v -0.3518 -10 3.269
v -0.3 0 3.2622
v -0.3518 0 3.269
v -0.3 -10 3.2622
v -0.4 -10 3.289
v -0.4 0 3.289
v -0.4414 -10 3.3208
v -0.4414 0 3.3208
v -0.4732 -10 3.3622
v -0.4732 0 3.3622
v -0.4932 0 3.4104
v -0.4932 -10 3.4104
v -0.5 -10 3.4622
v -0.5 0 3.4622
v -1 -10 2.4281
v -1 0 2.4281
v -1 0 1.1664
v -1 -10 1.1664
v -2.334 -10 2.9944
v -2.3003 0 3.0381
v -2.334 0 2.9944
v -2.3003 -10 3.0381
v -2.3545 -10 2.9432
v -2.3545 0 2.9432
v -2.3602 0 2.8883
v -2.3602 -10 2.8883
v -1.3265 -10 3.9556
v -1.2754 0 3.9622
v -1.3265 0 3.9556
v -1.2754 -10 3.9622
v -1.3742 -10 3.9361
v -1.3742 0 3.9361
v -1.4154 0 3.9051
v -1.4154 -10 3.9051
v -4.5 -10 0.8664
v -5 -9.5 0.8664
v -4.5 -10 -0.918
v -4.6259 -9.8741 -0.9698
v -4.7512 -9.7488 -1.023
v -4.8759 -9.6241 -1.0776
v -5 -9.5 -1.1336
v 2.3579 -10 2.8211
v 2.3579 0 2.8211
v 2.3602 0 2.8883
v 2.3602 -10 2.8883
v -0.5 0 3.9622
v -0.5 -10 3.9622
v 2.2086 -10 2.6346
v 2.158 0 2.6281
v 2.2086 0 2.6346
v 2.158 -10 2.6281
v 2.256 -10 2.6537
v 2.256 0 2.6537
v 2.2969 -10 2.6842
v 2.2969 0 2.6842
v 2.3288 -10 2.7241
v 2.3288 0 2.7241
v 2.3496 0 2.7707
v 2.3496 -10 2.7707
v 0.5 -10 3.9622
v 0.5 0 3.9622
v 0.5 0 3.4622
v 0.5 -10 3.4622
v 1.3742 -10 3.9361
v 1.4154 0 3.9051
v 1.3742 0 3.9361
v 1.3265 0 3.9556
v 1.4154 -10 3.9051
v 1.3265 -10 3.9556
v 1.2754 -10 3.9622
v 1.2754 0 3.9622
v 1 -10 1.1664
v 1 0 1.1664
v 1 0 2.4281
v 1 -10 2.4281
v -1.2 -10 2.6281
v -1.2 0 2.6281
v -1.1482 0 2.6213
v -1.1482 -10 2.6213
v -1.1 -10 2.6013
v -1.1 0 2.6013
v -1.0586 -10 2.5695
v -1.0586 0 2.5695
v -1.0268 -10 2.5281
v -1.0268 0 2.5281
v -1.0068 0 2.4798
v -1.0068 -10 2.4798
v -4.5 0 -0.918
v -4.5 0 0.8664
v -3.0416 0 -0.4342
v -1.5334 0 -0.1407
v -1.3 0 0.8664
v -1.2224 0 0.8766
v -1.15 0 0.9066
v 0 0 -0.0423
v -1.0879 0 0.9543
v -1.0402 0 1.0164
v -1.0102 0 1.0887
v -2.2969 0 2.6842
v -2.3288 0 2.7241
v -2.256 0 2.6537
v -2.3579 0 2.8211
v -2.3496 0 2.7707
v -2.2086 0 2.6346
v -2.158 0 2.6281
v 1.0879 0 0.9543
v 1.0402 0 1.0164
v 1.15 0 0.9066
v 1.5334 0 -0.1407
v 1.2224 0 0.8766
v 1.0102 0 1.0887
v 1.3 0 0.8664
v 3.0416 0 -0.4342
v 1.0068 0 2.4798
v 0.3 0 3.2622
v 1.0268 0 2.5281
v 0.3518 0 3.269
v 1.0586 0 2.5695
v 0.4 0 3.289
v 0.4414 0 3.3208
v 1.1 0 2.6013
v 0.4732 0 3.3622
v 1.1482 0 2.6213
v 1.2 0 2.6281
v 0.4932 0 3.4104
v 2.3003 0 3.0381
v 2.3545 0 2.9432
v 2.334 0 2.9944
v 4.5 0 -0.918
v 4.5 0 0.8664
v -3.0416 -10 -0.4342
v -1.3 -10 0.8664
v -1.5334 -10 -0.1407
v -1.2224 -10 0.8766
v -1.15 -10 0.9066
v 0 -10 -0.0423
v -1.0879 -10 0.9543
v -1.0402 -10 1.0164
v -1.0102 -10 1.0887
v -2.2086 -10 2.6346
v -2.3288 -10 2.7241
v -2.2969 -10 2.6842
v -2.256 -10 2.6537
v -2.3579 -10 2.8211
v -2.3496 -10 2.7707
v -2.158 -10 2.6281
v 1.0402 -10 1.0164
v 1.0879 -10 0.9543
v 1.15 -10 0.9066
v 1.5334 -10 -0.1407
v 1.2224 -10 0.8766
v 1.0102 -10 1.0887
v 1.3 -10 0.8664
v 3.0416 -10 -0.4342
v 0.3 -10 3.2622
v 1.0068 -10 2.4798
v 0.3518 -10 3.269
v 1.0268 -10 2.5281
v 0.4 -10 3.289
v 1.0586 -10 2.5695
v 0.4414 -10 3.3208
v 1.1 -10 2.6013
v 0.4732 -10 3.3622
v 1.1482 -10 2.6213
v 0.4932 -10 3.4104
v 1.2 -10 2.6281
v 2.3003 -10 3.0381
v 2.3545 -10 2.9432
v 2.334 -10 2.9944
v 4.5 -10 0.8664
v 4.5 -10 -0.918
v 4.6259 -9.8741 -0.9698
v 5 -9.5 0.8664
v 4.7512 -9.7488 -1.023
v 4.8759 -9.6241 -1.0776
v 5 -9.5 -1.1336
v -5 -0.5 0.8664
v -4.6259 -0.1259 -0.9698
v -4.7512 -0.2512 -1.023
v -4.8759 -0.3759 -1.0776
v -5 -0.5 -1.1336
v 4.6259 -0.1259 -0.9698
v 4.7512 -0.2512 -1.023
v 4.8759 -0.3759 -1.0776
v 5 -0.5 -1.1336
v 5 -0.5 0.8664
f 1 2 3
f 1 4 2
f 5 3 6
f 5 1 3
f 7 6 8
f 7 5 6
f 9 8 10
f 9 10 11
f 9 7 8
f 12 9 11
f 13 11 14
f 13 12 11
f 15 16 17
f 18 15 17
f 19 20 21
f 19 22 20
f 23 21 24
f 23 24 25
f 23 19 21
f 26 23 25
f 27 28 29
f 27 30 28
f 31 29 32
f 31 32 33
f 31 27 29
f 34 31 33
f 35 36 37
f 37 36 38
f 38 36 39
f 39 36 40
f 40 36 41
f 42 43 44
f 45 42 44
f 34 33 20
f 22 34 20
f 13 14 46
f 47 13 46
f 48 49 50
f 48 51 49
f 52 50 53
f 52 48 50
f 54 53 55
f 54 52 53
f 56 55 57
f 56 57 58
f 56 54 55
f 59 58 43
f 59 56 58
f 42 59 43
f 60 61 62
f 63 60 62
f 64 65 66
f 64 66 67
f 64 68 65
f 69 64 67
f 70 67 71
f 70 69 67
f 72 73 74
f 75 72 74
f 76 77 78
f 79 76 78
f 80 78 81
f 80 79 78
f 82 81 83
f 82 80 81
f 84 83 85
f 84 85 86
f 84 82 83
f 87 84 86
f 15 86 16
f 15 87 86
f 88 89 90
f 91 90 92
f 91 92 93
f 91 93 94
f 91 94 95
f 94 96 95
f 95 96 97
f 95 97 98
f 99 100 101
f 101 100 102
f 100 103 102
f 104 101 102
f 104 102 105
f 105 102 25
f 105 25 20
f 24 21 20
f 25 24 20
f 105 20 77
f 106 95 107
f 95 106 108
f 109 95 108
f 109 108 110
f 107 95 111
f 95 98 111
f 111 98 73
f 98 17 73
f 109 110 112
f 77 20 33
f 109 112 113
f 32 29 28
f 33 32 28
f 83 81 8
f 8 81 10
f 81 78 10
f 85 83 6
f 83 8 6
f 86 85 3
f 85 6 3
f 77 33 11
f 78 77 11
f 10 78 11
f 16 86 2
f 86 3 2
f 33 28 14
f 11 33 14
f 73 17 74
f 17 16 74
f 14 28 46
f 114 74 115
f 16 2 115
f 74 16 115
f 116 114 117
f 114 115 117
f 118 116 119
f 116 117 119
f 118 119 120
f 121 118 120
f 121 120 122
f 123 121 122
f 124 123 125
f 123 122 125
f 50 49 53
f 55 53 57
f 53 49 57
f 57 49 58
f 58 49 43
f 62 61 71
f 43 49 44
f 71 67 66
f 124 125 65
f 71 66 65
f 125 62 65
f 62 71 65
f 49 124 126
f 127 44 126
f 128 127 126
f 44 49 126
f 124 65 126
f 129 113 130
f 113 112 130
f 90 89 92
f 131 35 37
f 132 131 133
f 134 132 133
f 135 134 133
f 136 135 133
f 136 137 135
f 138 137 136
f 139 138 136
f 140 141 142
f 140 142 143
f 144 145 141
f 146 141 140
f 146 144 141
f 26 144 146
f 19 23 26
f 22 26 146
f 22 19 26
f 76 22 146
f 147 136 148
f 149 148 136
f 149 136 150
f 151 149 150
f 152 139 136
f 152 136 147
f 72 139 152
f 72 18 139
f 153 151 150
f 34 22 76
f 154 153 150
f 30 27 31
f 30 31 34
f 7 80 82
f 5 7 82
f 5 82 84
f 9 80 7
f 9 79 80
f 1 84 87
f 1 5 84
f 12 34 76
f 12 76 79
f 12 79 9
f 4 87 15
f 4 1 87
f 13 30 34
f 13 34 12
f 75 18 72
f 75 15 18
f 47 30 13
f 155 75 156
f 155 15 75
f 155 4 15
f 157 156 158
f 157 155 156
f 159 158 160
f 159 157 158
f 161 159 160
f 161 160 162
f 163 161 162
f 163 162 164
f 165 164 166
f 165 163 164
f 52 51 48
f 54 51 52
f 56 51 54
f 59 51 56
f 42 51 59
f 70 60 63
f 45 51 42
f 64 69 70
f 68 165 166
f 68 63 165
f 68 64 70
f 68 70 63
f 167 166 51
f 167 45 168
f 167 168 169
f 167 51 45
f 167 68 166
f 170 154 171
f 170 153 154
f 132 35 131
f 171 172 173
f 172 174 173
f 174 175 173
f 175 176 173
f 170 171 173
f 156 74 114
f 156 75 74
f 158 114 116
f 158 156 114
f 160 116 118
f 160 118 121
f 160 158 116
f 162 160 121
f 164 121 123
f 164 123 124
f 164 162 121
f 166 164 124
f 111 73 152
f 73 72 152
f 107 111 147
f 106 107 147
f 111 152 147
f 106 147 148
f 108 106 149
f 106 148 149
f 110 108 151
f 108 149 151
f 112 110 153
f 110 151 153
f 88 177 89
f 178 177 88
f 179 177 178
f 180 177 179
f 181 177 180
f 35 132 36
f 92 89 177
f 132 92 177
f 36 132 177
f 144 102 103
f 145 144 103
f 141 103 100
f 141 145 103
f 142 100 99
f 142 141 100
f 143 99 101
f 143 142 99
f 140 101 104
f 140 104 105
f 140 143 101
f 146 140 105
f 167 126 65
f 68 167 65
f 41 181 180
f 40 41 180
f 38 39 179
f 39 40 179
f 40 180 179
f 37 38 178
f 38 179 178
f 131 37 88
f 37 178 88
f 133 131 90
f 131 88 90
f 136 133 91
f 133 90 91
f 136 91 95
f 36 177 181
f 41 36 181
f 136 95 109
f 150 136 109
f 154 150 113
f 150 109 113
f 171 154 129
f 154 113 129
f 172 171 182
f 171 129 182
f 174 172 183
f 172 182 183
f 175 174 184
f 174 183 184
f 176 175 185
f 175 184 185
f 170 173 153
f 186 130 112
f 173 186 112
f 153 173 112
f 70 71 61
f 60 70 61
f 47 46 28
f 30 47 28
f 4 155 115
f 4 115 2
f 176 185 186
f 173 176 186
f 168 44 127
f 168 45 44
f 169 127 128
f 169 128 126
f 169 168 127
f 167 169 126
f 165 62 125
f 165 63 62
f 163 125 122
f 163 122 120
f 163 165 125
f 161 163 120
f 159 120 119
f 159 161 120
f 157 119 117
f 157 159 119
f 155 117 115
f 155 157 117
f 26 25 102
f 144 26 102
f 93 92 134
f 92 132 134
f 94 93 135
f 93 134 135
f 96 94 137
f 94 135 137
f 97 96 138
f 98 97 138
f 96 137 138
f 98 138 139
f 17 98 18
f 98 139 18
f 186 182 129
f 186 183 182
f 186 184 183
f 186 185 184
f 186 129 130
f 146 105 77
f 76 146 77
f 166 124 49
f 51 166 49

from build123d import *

# Parameters (mm, degrees)
F1_DEPTH = 10
F2_R     = 0.2
F3_R     = 0.3
F4_SIZE  = 0.5


# Not quite as in the source:
# - a feature names something its author has since deleted; it is built from what else it names


with BuildPart() as f1:
    # F0 (on Front) → F1 (new body)
    with BuildSketch(Plane.XZ):
        with BuildLine():
            Line((-5, 0.8663841993), (-5, -1.1336158007))
            ThreePointArc((-5, -1.1336158007), (-2.5588527336, -0.3183237919), (0, -0.0423279154))
            ThreePointArc((0, -0.0423279154), (2.5588527336, -0.3183237919), (5, -1.1336158007))
            Line((5, -1.1336158007), (5, 0.8663841993))
            Line((5, 0.8663841993), (1, 0.8663841993))
            Line((1, 0.8663841993), (1, 2.6280805469))
            Line((1, 2.6280805469), (2.3511576001, 2.6280805469))
            Line((2.3511576001, 2.6280805469), (2.363298554, 2.9764297366))
            Line((2.363298554, 2.9764297366), (1.357049332, 3.9621986704))
            Line((1.357049332, 3.9621986704), (0.5, 3.9621986704))
            Line((0.5, 3.9621986704), (0.5, 3.2621986704))
            Line((0.5, 3.2621986704), (0, 3.2621986704))
            Line((0, 3.2621986704), (-0.5, 3.2621986704))
            Line((-0.5, 3.2621986704), (-0.5, 3.9621986704))
            Line((-0.5, 3.9621986704), (-1.357049332, 3.9621986704))
            Line((-1.357049332, 3.9621986704), (-2.363298554, 2.9764297366))
            Line((-2.363298554, 2.9764297366), (-2.3511576001, 2.6280805469))
            Line((-2.3511576001, 2.6280805469), (-1, 2.6280805469))
            Line((-1, 2.6280805469), (-1, 0.8663841993))
            Line((-1, 0.8663841993), (-5, 0.8663841993))
        make_face()
    extrude(amount=F1_DEPTH)

    # F2
    f2_edges = [f1.edges().sort_by_distance(p)[0] for p in [
        (-0.5, -5, 3.262199),
        (0.5, -5, 3.262199),
        (2.351158, -5, 2.628081),
        (1, -5, 2.628081),
        (2.363299, -5, 2.97643),
        (1.357049, -5, 3.962199),
        (-1, -5, 2.628081),
        (-2.351158, -5, 2.628081),
        (-2.363299, -5, 2.97643),
        (-1.357049, -5, 3.962199),
    ]]
    fillet(f2_edges, radius=F2_R)

    # F3
    f3_edges = [f1.edges().sort_by_distance(p)[0] for p in [
        (-1, -5, 0.866384),
        (1, -5, 0.866384),
    ]]
    fillet(f3_edges, radius=F3_R)

    # F4
    f4_edges = [f1.edges().sort_by_distance(p)[0] for p in [
        (-5, -10, -0.133616),
        (5, -10, -0.133616),
        (5, 0, -0.133616),
        (-5, 0, -0.133616),
    ]]
    chamfer(f4_edges, length=F4_SIZE)


solid = f1.part
